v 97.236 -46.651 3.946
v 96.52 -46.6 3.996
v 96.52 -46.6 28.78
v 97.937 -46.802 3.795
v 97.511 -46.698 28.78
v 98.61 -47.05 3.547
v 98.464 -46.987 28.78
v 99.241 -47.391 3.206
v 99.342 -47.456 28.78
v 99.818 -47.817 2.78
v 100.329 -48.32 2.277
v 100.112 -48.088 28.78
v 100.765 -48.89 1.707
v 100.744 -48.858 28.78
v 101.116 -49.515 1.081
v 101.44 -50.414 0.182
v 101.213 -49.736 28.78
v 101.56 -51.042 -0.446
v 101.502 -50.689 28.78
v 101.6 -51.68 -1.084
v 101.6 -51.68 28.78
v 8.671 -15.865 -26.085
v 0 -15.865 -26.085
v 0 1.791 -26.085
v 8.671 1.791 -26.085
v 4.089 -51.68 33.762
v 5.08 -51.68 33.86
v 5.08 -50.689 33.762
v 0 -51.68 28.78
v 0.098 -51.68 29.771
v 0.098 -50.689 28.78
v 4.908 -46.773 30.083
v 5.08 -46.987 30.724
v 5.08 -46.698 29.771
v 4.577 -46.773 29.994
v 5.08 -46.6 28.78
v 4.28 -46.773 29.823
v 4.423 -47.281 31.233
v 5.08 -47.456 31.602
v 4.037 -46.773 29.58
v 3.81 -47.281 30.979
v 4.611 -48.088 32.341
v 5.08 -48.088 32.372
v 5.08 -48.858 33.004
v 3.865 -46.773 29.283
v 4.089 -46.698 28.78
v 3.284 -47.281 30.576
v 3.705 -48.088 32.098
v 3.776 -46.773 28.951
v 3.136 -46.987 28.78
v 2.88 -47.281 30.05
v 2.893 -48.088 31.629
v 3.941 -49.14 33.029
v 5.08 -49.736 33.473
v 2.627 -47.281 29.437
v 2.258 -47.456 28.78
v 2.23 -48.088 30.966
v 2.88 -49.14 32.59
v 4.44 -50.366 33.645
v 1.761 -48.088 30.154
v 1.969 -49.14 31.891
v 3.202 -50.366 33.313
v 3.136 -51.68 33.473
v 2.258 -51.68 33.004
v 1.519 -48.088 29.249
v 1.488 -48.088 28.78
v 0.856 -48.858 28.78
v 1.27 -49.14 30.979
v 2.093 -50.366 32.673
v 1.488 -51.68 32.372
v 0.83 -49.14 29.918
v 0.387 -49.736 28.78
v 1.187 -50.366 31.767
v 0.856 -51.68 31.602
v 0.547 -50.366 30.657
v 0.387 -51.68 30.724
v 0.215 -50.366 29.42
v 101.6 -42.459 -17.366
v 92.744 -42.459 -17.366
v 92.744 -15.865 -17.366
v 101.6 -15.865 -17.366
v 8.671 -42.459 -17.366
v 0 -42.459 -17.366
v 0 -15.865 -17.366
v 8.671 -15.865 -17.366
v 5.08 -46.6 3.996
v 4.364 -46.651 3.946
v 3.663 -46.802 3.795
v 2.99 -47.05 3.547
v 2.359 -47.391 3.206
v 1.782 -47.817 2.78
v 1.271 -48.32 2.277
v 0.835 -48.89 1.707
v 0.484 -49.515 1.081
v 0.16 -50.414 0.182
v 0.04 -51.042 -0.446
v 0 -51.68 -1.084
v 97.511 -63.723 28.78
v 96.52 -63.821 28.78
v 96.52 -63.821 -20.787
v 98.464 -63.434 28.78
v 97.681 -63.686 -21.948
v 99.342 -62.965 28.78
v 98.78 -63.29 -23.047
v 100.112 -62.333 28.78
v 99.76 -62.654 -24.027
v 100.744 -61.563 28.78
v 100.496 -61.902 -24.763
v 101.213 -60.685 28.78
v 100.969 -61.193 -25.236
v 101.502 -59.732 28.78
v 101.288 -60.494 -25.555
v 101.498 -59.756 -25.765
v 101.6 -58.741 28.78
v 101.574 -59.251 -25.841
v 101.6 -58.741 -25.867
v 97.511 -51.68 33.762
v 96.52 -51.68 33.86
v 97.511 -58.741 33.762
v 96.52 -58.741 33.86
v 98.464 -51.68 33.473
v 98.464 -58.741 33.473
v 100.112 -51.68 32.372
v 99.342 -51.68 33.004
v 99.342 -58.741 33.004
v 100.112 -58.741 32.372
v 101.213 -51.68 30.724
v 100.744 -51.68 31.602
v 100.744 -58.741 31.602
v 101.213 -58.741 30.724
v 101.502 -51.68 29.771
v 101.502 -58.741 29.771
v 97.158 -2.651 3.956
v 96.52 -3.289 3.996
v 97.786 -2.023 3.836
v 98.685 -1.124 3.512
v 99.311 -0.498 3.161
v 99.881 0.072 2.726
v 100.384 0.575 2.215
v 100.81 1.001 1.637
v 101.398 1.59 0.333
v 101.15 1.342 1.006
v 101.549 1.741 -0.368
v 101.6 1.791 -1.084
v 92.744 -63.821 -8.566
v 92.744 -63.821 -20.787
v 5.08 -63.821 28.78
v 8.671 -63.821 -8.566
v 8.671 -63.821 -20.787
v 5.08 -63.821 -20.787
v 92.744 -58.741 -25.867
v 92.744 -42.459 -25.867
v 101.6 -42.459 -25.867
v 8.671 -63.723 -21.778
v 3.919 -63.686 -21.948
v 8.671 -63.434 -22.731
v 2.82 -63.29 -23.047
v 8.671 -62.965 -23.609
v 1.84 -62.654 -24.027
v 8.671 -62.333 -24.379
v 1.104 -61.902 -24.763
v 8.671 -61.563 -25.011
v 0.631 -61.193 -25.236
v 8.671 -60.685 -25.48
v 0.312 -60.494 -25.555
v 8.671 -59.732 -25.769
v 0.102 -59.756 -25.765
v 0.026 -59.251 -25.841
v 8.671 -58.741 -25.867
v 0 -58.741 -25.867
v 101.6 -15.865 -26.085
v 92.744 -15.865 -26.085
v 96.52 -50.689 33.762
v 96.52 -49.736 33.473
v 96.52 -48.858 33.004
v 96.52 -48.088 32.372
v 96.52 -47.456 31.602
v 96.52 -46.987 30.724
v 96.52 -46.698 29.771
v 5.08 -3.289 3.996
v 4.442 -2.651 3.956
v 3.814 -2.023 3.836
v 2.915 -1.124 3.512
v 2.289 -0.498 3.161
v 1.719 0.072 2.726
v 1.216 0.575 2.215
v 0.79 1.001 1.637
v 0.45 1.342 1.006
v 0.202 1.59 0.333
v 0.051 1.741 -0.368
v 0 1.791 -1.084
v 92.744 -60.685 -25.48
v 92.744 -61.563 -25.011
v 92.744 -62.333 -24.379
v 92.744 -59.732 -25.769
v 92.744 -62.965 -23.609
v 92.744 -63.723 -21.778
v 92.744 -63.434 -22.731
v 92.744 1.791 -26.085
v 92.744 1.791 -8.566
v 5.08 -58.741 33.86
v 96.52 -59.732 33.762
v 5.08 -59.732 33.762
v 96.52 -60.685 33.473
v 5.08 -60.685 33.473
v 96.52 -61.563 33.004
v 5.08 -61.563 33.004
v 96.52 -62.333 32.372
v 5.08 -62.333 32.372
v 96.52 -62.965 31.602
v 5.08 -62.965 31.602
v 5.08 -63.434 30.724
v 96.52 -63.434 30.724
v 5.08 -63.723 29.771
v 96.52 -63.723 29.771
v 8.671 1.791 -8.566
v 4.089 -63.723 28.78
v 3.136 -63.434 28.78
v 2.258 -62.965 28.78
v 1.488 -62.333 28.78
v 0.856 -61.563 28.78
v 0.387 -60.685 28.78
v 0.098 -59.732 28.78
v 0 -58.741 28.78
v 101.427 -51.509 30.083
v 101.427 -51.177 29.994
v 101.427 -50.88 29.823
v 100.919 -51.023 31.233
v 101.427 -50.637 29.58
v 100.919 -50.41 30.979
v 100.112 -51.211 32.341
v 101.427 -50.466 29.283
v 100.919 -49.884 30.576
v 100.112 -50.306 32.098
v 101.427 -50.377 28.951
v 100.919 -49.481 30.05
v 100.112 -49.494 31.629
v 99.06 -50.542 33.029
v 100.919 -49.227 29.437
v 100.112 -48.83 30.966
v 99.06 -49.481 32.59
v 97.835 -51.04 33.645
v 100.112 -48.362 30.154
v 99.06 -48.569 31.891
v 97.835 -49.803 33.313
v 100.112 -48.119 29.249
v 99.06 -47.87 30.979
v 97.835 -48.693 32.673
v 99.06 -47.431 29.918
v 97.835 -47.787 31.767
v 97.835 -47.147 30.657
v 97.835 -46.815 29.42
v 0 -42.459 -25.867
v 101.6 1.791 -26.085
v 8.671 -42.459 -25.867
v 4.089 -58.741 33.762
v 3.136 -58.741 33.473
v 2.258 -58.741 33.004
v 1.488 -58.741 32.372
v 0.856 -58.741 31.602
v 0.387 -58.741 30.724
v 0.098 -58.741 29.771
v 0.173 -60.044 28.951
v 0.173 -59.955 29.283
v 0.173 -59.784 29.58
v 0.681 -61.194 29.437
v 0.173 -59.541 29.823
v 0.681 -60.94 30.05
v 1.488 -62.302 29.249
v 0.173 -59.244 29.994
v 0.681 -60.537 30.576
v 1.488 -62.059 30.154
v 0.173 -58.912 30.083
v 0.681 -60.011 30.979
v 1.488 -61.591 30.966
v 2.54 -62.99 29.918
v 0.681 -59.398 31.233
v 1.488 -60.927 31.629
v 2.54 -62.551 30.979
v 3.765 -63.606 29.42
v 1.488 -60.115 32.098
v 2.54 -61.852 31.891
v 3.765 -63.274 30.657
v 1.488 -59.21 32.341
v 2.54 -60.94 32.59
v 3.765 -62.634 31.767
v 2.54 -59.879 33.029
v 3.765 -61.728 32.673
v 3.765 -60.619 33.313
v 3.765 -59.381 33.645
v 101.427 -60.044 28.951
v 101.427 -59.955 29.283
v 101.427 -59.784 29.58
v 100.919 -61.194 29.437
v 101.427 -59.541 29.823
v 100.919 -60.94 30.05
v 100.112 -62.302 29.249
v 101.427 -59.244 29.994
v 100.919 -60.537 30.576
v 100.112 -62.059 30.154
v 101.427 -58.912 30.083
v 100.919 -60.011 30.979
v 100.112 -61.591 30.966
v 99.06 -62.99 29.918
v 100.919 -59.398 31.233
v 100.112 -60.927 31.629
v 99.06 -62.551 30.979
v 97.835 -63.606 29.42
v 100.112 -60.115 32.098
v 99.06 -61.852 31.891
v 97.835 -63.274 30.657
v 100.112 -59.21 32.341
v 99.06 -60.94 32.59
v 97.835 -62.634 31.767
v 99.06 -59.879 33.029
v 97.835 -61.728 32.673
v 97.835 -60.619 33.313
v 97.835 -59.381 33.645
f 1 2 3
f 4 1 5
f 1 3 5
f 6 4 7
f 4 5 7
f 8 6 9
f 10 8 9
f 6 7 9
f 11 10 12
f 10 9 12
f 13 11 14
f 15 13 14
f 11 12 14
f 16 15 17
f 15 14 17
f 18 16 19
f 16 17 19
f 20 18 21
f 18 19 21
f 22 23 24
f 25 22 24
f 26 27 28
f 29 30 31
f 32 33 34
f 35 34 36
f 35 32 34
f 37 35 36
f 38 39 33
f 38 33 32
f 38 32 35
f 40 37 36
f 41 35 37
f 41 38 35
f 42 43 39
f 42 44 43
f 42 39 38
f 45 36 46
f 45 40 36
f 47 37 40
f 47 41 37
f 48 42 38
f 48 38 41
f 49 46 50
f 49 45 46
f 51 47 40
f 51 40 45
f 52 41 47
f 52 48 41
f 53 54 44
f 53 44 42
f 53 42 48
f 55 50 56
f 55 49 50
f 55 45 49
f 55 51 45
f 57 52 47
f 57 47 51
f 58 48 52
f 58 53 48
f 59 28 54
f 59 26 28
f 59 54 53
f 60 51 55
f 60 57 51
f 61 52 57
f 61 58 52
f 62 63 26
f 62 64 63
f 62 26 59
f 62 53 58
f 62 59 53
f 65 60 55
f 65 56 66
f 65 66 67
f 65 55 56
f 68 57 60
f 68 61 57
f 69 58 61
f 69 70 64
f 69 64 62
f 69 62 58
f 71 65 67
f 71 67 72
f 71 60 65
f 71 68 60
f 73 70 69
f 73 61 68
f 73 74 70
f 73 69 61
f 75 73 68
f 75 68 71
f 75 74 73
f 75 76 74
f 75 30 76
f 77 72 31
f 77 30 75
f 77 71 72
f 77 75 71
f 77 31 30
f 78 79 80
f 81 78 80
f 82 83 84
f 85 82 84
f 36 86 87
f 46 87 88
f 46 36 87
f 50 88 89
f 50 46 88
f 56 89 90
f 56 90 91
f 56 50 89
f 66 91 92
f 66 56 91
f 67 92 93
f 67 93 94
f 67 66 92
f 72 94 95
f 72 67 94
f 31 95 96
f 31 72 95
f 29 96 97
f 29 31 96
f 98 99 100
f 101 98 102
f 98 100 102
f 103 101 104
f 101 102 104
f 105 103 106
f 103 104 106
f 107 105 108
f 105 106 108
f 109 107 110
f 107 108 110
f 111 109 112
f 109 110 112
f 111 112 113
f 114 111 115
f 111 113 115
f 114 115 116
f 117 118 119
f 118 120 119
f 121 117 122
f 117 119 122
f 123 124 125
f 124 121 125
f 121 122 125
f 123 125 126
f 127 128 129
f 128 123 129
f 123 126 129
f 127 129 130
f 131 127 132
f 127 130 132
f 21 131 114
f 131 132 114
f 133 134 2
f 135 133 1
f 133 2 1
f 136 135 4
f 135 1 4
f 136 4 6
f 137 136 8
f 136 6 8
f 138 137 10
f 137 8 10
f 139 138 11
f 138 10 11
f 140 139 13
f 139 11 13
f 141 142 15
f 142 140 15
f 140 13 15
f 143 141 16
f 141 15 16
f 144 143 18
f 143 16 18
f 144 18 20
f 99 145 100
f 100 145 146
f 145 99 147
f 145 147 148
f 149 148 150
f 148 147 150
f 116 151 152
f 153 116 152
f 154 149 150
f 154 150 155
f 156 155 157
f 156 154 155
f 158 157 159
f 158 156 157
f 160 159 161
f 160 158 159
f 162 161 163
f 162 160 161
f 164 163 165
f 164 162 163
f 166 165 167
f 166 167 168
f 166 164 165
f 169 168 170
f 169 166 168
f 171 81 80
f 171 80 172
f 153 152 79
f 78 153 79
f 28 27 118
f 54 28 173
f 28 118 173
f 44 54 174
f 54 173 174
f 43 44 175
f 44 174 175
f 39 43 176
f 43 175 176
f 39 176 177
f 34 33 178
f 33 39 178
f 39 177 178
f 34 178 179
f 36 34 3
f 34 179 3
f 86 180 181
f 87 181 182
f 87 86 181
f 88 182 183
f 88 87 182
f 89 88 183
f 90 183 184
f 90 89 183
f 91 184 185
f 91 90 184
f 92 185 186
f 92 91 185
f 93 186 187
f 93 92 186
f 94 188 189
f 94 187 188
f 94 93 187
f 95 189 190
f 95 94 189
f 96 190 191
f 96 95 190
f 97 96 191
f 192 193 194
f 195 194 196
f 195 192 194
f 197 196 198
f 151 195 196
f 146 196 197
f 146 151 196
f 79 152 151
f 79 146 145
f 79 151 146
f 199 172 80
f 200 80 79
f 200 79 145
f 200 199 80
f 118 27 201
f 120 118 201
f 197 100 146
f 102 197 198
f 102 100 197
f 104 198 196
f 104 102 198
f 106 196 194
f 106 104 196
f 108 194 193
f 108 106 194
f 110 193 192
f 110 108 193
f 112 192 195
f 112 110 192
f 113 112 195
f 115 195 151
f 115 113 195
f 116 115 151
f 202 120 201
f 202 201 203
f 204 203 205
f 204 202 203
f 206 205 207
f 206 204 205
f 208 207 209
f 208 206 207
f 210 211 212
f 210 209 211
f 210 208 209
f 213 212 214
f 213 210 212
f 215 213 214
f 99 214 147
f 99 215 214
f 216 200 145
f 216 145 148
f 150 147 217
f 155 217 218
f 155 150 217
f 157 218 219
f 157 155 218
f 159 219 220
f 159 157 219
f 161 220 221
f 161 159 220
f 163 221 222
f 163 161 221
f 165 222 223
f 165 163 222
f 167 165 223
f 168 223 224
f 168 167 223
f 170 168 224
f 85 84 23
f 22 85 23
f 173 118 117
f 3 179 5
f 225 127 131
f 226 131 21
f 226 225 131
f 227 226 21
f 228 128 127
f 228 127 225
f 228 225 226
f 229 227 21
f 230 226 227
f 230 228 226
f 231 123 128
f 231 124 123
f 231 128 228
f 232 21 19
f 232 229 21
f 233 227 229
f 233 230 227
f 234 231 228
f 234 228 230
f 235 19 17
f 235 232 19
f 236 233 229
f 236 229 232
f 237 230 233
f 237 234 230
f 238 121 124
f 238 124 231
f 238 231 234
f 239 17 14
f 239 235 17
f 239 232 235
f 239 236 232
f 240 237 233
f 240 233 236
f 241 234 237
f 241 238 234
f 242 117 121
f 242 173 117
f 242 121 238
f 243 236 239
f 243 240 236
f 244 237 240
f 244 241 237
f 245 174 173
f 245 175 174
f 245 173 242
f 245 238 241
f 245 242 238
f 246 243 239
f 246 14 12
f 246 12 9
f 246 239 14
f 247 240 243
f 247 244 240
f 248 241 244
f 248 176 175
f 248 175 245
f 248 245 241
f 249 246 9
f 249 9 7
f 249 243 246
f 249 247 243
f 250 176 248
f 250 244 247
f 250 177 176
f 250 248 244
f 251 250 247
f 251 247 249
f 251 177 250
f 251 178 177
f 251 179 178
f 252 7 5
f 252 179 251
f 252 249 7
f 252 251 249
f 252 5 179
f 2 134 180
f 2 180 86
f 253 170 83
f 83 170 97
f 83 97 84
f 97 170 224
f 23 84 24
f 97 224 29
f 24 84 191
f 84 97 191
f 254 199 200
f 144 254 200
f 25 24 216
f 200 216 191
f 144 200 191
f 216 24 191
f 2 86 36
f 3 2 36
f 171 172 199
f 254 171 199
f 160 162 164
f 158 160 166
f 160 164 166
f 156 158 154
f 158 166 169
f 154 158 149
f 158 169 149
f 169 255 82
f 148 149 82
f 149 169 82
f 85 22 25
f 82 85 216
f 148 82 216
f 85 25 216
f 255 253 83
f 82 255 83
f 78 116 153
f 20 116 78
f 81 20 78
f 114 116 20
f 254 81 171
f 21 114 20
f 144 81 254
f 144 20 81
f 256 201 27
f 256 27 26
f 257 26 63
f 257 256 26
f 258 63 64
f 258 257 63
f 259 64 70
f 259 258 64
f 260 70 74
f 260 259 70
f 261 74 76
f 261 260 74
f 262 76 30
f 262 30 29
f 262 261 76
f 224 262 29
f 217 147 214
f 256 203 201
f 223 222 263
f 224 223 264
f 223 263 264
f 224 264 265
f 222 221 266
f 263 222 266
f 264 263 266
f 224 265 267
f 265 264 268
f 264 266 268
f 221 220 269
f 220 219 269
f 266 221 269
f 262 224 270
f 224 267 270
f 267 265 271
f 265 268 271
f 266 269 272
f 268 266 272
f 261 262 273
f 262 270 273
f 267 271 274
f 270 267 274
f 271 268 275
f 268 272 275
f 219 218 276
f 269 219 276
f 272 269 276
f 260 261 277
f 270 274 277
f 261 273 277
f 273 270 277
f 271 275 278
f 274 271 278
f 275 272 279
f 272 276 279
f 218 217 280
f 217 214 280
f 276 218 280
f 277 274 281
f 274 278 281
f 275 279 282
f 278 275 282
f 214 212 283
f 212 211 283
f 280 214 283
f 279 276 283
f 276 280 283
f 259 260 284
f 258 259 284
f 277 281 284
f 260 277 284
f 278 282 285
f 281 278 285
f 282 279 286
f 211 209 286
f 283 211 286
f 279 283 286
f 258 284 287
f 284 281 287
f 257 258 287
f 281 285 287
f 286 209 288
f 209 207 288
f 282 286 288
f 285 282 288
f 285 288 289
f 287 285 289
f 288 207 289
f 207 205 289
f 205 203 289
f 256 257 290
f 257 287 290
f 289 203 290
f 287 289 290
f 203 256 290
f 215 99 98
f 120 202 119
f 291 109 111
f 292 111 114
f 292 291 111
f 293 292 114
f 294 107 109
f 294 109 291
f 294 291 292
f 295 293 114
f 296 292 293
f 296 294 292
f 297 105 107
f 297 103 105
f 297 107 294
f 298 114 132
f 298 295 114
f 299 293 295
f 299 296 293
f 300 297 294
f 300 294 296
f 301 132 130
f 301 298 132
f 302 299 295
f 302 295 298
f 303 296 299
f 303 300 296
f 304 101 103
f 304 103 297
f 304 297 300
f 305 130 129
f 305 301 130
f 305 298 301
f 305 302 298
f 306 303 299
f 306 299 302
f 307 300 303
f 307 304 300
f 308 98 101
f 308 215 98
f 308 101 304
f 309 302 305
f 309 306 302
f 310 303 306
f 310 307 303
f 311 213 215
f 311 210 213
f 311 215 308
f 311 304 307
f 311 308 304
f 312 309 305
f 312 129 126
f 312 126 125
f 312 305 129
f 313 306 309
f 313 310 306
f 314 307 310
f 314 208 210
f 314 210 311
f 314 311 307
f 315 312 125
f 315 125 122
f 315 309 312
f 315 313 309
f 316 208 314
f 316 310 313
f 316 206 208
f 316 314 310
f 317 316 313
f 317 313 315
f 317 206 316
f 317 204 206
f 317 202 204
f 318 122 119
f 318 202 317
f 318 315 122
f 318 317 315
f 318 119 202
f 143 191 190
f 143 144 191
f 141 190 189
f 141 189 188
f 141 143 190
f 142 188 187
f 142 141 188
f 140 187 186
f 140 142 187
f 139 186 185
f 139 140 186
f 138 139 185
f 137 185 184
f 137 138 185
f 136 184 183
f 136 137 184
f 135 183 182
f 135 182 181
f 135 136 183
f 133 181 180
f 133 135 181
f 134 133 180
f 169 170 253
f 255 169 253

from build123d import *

# Parameters (mm, degrees)
F1_DEPTH = 101.6
F2_R     = 5.08
F3_W     = 84.073769
F3_H     = 17.519306
F4_DEPTH = 65.613113


with BuildPart() as f1:
    # F0 (on Right) → F1 (new body)
    with BuildSketch(Plane.YZ):
        Polygon((-46.600301, 33.859685), (-63.820757, 33.859685), (-63.820757, -25.866956), (-42.458672, -25.866956), (-42.458672, -17.365716), (-15.865058, -17.365716), (-15.865058, -26.084935), (1.791356, -26.084935), (1.791356, 3.996365), (-46.600301, 3.996365), align=None)
    extrude(amount=F1_DEPTH)

    # F2
    f2_edges = [f1.edges().sort_by_distance(p)[0] for p in [
        (50.8, -63.820757, 33.859685),
        (50.8, -63.820757, -25.866956),
        (0, -63.820757, 3.996365),
        (101.6, -63.820757, 3.996365),
        (50.8, 1.791356, 3.996365),
        (101.6, -22.404472, 3.996365),
        (0, -22.404472, 3.996365),
        (0, -55.210529, 33.859685),
        (50.8, -46.600301, 33.859685),
        (101.6, -55.210529, 33.859685),
        (101.6, -46.600301, 18.928025),
        (0, -46.600301, 18.928025),
    ]]
    fillet(f2_edges, radius=F2_R)

    # F3 (on face) → F4 (cut, through all)
    with BuildSketch(Plane(origin=(0, 1.791356, 0), x_dir=(-1, 0, 0), z_dir=(0, 1, 0))):
        with Locations((-50.707488, -17.325282)):
            Rectangle(F3_W, F3_H)
    extrude(amount=-F4_DEPTH, mode=Mode.SUBTRACT)


solid = f1.part
